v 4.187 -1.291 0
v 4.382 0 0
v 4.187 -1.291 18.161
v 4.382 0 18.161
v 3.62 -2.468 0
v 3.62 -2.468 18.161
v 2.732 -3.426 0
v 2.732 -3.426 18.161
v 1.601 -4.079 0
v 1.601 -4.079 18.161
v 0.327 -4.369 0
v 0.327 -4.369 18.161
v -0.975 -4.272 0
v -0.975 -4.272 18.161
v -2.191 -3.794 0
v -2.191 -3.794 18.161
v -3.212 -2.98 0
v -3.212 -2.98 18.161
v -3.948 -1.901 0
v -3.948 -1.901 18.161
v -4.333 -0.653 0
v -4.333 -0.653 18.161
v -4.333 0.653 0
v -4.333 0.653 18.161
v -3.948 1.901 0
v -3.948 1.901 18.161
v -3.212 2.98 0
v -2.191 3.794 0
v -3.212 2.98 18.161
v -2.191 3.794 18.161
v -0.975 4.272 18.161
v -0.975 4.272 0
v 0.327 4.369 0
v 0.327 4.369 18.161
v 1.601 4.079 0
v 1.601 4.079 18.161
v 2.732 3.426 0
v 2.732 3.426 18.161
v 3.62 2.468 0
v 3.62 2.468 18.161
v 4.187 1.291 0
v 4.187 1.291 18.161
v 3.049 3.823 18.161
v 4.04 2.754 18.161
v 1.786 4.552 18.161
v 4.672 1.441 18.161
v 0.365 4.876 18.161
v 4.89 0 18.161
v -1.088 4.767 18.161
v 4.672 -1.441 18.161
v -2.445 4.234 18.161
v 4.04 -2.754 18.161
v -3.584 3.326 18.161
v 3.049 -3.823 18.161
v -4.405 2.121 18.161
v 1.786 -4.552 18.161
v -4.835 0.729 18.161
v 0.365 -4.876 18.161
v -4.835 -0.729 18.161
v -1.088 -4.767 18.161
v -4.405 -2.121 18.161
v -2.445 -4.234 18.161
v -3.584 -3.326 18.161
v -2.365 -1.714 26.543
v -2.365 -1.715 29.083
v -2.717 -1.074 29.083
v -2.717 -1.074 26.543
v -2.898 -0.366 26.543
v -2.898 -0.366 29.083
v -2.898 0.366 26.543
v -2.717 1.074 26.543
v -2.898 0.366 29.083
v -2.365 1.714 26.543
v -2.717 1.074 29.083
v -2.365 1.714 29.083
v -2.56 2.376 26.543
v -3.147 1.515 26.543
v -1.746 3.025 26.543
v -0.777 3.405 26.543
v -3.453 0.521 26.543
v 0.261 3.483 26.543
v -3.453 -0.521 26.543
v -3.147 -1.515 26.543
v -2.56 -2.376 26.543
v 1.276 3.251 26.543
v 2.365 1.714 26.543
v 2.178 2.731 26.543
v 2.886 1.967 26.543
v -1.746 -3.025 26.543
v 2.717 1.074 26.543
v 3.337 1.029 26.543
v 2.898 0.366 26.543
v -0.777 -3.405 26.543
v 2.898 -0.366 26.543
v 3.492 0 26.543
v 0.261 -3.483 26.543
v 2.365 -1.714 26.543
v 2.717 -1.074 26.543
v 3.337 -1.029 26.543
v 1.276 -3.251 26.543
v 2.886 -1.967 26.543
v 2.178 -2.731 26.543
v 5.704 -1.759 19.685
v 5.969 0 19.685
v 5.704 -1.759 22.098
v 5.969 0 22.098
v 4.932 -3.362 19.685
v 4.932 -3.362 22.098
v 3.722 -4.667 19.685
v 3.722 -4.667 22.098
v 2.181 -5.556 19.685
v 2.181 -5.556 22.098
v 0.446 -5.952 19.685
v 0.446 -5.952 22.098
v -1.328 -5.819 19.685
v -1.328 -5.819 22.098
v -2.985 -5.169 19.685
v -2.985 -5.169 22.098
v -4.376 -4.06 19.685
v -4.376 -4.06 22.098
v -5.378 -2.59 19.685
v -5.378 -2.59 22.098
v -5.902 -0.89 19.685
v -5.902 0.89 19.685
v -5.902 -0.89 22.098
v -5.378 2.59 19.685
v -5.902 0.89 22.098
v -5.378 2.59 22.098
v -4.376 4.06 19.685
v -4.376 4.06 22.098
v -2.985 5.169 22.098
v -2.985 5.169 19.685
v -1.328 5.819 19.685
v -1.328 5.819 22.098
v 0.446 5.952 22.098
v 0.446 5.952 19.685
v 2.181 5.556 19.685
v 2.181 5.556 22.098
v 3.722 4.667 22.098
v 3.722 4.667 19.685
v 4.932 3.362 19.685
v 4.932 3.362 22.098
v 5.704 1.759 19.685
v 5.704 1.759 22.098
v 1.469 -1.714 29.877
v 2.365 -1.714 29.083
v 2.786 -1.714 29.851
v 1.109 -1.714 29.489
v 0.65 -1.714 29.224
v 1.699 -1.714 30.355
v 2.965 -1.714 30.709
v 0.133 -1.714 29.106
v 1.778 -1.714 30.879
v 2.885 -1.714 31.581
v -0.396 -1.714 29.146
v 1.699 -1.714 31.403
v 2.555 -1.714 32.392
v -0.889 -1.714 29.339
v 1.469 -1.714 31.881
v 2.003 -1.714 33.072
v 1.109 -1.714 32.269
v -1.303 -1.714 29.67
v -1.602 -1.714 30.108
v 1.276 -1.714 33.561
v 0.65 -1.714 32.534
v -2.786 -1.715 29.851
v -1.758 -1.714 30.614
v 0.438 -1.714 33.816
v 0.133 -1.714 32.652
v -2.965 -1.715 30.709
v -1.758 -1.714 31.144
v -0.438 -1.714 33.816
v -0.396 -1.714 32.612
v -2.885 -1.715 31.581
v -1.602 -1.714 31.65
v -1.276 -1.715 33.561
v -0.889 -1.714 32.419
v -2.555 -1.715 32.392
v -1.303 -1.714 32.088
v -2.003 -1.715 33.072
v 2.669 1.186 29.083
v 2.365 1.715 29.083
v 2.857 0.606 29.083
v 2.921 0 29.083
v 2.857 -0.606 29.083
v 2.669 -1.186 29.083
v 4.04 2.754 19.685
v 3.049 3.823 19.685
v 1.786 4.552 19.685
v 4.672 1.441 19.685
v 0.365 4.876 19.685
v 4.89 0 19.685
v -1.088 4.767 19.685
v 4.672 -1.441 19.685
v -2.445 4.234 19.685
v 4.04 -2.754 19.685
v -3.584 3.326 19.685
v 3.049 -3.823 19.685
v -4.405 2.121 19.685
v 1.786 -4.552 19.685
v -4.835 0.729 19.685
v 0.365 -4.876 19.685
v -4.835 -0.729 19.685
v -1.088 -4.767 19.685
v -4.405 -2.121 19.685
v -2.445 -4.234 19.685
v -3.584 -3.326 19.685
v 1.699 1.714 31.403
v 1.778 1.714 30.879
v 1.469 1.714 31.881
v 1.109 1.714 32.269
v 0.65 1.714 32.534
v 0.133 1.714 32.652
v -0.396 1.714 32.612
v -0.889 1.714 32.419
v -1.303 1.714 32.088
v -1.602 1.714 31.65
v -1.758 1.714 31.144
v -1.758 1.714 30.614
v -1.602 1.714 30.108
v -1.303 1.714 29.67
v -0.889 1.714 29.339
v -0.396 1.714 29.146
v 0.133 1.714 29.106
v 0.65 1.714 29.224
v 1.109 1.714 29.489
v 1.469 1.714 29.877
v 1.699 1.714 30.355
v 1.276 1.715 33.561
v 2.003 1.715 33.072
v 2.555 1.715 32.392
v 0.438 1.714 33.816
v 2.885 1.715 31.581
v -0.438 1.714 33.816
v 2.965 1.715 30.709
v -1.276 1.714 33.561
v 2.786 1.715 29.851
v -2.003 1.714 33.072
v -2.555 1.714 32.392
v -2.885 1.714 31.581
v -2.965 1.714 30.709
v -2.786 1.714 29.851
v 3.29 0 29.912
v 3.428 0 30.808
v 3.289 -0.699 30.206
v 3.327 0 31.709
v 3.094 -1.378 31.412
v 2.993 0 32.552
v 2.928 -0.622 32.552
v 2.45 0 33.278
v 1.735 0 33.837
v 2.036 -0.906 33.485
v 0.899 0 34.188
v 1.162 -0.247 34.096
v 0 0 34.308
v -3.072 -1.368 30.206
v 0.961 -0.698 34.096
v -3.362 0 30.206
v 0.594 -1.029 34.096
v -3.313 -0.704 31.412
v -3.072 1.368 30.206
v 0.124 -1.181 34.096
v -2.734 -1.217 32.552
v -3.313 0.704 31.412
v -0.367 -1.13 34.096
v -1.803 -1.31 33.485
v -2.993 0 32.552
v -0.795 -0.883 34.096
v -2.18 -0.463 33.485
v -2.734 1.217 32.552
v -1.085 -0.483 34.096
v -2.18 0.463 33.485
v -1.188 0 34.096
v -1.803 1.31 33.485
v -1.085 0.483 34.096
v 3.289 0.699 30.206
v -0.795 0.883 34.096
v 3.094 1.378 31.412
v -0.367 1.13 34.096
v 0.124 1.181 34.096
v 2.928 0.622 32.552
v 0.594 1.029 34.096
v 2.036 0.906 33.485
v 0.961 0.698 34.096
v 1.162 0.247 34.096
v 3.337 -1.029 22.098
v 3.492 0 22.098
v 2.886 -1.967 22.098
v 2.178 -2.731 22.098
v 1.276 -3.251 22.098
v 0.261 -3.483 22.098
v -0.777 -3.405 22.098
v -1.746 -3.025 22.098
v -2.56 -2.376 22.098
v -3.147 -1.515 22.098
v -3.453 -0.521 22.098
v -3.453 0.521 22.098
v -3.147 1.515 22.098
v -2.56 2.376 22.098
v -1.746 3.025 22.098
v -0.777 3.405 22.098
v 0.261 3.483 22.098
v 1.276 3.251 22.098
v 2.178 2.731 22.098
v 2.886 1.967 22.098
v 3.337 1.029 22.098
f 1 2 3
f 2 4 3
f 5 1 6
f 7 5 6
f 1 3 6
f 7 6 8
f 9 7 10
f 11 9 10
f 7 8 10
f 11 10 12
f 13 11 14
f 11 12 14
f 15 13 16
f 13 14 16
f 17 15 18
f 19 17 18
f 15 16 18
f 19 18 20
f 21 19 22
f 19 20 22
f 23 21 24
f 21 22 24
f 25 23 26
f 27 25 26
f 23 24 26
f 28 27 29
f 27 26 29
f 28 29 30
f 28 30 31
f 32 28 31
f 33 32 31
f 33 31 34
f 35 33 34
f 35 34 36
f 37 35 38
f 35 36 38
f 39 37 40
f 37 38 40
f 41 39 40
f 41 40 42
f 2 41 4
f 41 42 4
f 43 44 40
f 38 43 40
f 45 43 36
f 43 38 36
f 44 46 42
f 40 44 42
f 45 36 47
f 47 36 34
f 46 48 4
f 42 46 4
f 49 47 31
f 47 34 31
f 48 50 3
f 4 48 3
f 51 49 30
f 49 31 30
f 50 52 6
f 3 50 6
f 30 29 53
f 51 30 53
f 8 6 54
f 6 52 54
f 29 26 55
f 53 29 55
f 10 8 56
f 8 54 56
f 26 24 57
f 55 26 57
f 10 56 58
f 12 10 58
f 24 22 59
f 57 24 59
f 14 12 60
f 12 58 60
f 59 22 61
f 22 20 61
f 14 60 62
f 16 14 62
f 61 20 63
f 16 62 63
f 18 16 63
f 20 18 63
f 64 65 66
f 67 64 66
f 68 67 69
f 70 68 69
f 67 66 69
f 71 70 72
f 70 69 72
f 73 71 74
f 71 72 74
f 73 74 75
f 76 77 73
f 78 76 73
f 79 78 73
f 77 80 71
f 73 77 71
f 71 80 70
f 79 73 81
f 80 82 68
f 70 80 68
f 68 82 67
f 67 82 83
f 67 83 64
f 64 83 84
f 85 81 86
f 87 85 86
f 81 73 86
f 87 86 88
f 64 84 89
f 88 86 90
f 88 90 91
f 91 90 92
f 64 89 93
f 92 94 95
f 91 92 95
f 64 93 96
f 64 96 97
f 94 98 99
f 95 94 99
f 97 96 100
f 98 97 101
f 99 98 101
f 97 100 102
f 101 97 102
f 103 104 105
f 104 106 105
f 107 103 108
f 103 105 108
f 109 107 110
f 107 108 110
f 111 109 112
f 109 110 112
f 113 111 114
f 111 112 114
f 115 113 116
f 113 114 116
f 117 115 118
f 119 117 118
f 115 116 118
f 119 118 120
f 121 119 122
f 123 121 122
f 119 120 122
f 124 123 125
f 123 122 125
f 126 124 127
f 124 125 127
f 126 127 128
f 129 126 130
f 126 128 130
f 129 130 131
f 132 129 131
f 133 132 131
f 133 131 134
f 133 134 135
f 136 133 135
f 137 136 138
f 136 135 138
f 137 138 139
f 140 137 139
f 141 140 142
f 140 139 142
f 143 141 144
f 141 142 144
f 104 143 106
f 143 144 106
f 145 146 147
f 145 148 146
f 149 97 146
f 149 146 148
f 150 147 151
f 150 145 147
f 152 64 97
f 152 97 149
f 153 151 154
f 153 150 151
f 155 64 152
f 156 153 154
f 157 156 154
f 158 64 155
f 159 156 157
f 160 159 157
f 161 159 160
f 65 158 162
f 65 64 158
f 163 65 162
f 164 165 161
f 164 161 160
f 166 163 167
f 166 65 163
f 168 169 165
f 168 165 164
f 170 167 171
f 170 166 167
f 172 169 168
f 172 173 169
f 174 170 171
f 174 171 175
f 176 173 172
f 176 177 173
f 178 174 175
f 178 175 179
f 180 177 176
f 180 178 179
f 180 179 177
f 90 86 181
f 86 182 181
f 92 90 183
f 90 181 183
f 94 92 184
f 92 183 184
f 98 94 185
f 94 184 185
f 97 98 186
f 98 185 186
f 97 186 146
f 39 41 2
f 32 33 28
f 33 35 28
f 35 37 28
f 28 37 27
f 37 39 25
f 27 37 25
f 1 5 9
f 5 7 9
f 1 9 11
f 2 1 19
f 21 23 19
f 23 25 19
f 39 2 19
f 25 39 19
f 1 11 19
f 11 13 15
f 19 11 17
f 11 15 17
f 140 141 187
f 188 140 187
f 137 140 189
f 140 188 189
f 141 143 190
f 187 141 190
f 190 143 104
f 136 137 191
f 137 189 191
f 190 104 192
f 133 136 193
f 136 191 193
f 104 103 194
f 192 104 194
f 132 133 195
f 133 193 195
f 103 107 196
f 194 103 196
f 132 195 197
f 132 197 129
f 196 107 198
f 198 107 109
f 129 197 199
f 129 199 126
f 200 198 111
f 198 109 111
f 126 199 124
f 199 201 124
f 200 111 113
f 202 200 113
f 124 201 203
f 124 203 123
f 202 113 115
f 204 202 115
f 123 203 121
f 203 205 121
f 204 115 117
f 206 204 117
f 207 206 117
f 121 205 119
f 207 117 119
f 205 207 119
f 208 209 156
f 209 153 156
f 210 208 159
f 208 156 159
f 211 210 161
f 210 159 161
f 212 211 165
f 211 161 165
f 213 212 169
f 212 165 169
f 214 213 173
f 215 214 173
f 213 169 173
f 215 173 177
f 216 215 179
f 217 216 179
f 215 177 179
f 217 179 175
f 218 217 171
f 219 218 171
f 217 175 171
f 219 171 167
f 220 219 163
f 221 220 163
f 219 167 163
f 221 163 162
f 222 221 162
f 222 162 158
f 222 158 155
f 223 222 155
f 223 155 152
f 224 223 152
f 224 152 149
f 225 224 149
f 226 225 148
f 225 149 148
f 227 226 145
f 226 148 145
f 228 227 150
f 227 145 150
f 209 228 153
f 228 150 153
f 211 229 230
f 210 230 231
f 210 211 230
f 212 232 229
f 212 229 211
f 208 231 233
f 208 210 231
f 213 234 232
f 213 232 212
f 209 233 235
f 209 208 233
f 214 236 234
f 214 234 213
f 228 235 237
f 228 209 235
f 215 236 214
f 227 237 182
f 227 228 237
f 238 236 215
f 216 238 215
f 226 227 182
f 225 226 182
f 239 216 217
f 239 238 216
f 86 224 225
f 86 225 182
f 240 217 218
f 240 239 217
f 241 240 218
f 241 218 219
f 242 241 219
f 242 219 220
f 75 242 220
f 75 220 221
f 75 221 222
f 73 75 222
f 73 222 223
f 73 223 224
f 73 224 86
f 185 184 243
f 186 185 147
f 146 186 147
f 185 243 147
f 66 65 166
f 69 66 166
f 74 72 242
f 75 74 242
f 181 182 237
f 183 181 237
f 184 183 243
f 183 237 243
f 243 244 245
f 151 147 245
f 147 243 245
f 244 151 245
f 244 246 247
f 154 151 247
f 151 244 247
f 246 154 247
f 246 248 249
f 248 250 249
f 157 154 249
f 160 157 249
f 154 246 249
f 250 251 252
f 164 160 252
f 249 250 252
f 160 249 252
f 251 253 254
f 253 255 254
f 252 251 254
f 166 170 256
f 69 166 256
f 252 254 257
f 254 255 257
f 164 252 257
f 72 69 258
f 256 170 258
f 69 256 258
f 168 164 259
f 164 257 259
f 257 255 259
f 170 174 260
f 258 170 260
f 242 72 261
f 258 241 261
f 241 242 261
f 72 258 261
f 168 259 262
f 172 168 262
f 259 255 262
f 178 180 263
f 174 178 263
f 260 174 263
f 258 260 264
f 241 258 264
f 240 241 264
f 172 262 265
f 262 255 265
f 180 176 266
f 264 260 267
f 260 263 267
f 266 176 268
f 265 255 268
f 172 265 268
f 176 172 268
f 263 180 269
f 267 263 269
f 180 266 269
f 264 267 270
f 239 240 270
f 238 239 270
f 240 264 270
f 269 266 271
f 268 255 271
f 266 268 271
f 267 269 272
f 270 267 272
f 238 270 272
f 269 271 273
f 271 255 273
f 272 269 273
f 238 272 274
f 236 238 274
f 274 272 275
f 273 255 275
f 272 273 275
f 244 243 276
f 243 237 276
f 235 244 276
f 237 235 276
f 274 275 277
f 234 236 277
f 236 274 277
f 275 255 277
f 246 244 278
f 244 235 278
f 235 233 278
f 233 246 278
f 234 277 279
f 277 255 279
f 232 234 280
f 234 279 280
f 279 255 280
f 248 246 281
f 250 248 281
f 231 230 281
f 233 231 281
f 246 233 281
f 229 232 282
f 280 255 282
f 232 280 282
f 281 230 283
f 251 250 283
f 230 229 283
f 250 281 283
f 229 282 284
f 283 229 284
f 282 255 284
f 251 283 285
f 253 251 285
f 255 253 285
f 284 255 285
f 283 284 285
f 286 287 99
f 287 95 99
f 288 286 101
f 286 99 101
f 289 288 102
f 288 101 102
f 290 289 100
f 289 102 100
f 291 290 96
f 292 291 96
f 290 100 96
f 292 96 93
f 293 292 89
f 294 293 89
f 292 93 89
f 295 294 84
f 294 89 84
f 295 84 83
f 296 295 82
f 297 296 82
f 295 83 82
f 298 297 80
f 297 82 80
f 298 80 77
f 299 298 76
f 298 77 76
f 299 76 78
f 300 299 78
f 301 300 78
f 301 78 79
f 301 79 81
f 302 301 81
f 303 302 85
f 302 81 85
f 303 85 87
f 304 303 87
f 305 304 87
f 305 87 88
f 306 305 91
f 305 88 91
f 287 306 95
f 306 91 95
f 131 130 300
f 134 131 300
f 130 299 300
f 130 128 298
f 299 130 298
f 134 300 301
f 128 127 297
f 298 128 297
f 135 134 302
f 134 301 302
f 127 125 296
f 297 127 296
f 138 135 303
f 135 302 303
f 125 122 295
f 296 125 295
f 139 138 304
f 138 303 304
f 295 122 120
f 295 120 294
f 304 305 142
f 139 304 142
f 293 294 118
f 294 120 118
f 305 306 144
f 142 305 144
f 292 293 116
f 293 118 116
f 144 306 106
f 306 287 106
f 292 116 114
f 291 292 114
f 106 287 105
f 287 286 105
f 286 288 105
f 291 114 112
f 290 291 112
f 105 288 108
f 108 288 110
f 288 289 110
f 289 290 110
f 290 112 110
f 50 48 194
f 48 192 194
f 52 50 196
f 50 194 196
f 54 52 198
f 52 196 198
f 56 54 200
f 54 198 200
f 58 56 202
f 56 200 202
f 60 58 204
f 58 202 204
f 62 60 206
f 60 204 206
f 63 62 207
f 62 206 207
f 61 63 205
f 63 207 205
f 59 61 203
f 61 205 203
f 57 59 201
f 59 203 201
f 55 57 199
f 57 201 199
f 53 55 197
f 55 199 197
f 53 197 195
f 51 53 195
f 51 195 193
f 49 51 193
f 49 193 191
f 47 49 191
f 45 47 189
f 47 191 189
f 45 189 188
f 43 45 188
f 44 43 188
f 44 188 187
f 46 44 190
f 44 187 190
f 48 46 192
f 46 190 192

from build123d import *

# Parameters (mm, degrees)
F3_DEPTH      = 5.97
F3_DEPTH_BACK = 5.97
F4_R          = 1.778
F5_DEPTH      = 5.97
F5_DEPTH_BACK = 5.97


with BuildPart() as f1:
    # F0 (on Front) → F1 (revolve)
    with BuildSketch(Plane.XZ):
        with BuildLine():
            Line((0, 26.543), (0, 0))
            Line((0, 0), (4.3815, 0))
            Line((4.3815, 0), (4.3815, 18.161))
            Line((4.3815, 18.161), (4.8895, 18.161))
            Line((4.8895, 18.161), (4.8895, 19.685))
            Line((4.8895, 19.685), (5.969, 19.685))
            Line((5.969, 19.685), (5.969, 20.828))
            Line((5.969, 20.828), (5.969, 22.098))
            Line((5.969, 22.098), (3.4925, 22.098))
            Line((3.4925, 22.098), (3.4925, 26.543))
            Line((3.4925, 26.543), (2.921, 26.543))
            Line((2.921, 26.543), (2.921, 29.083))
            ThreePointArc((2.921, 29.083), (2.9930503377, 32.5522788465), (0, 34.3080512242))
            Line((0, 34.3080512242), (0, 26.543))
        make_face()
    revolve(axis=Axis((0, 0, 28.8581177592), (0, 0, -1)))

    # F2 (on Right) → F3 (cut, two sides)
    with BuildSketch(Plane.YZ) as f3_sk:
        Polygon((-3.4925, 26.543), (-1.7145, 26.543), (-1.7145, 36.703), (-6.1595, 36.703), (-6.1595, 26.543), align=None)
        Polygon((3.4925, 26.543), (6.1595, 26.543), (6.1595, 36.703), (1.7145, 36.703), (1.7145, 26.543), align=None)
    extrude(amount=F3_DEPTH, mode=Mode.SUBTRACT)
    extrude(f3_sk.sketch, amount=-F3_DEPTH_BACK, mode=Mode.SUBTRACT)

    # F4 (on Front) → F5 (cut, two sides)
    with BuildSketch(Plane.XZ) as f5_sk:
        with Locations((0, 30.8790512242)):
            Circle(F4_R)
    extrude(amount=-F5_DEPTH, mode=Mode.SUBTRACT)
    extrude(f5_sk.sketch, amount=F5_DEPTH_BACK, mode=Mode.SUBTRACT)


solid = f1.part
